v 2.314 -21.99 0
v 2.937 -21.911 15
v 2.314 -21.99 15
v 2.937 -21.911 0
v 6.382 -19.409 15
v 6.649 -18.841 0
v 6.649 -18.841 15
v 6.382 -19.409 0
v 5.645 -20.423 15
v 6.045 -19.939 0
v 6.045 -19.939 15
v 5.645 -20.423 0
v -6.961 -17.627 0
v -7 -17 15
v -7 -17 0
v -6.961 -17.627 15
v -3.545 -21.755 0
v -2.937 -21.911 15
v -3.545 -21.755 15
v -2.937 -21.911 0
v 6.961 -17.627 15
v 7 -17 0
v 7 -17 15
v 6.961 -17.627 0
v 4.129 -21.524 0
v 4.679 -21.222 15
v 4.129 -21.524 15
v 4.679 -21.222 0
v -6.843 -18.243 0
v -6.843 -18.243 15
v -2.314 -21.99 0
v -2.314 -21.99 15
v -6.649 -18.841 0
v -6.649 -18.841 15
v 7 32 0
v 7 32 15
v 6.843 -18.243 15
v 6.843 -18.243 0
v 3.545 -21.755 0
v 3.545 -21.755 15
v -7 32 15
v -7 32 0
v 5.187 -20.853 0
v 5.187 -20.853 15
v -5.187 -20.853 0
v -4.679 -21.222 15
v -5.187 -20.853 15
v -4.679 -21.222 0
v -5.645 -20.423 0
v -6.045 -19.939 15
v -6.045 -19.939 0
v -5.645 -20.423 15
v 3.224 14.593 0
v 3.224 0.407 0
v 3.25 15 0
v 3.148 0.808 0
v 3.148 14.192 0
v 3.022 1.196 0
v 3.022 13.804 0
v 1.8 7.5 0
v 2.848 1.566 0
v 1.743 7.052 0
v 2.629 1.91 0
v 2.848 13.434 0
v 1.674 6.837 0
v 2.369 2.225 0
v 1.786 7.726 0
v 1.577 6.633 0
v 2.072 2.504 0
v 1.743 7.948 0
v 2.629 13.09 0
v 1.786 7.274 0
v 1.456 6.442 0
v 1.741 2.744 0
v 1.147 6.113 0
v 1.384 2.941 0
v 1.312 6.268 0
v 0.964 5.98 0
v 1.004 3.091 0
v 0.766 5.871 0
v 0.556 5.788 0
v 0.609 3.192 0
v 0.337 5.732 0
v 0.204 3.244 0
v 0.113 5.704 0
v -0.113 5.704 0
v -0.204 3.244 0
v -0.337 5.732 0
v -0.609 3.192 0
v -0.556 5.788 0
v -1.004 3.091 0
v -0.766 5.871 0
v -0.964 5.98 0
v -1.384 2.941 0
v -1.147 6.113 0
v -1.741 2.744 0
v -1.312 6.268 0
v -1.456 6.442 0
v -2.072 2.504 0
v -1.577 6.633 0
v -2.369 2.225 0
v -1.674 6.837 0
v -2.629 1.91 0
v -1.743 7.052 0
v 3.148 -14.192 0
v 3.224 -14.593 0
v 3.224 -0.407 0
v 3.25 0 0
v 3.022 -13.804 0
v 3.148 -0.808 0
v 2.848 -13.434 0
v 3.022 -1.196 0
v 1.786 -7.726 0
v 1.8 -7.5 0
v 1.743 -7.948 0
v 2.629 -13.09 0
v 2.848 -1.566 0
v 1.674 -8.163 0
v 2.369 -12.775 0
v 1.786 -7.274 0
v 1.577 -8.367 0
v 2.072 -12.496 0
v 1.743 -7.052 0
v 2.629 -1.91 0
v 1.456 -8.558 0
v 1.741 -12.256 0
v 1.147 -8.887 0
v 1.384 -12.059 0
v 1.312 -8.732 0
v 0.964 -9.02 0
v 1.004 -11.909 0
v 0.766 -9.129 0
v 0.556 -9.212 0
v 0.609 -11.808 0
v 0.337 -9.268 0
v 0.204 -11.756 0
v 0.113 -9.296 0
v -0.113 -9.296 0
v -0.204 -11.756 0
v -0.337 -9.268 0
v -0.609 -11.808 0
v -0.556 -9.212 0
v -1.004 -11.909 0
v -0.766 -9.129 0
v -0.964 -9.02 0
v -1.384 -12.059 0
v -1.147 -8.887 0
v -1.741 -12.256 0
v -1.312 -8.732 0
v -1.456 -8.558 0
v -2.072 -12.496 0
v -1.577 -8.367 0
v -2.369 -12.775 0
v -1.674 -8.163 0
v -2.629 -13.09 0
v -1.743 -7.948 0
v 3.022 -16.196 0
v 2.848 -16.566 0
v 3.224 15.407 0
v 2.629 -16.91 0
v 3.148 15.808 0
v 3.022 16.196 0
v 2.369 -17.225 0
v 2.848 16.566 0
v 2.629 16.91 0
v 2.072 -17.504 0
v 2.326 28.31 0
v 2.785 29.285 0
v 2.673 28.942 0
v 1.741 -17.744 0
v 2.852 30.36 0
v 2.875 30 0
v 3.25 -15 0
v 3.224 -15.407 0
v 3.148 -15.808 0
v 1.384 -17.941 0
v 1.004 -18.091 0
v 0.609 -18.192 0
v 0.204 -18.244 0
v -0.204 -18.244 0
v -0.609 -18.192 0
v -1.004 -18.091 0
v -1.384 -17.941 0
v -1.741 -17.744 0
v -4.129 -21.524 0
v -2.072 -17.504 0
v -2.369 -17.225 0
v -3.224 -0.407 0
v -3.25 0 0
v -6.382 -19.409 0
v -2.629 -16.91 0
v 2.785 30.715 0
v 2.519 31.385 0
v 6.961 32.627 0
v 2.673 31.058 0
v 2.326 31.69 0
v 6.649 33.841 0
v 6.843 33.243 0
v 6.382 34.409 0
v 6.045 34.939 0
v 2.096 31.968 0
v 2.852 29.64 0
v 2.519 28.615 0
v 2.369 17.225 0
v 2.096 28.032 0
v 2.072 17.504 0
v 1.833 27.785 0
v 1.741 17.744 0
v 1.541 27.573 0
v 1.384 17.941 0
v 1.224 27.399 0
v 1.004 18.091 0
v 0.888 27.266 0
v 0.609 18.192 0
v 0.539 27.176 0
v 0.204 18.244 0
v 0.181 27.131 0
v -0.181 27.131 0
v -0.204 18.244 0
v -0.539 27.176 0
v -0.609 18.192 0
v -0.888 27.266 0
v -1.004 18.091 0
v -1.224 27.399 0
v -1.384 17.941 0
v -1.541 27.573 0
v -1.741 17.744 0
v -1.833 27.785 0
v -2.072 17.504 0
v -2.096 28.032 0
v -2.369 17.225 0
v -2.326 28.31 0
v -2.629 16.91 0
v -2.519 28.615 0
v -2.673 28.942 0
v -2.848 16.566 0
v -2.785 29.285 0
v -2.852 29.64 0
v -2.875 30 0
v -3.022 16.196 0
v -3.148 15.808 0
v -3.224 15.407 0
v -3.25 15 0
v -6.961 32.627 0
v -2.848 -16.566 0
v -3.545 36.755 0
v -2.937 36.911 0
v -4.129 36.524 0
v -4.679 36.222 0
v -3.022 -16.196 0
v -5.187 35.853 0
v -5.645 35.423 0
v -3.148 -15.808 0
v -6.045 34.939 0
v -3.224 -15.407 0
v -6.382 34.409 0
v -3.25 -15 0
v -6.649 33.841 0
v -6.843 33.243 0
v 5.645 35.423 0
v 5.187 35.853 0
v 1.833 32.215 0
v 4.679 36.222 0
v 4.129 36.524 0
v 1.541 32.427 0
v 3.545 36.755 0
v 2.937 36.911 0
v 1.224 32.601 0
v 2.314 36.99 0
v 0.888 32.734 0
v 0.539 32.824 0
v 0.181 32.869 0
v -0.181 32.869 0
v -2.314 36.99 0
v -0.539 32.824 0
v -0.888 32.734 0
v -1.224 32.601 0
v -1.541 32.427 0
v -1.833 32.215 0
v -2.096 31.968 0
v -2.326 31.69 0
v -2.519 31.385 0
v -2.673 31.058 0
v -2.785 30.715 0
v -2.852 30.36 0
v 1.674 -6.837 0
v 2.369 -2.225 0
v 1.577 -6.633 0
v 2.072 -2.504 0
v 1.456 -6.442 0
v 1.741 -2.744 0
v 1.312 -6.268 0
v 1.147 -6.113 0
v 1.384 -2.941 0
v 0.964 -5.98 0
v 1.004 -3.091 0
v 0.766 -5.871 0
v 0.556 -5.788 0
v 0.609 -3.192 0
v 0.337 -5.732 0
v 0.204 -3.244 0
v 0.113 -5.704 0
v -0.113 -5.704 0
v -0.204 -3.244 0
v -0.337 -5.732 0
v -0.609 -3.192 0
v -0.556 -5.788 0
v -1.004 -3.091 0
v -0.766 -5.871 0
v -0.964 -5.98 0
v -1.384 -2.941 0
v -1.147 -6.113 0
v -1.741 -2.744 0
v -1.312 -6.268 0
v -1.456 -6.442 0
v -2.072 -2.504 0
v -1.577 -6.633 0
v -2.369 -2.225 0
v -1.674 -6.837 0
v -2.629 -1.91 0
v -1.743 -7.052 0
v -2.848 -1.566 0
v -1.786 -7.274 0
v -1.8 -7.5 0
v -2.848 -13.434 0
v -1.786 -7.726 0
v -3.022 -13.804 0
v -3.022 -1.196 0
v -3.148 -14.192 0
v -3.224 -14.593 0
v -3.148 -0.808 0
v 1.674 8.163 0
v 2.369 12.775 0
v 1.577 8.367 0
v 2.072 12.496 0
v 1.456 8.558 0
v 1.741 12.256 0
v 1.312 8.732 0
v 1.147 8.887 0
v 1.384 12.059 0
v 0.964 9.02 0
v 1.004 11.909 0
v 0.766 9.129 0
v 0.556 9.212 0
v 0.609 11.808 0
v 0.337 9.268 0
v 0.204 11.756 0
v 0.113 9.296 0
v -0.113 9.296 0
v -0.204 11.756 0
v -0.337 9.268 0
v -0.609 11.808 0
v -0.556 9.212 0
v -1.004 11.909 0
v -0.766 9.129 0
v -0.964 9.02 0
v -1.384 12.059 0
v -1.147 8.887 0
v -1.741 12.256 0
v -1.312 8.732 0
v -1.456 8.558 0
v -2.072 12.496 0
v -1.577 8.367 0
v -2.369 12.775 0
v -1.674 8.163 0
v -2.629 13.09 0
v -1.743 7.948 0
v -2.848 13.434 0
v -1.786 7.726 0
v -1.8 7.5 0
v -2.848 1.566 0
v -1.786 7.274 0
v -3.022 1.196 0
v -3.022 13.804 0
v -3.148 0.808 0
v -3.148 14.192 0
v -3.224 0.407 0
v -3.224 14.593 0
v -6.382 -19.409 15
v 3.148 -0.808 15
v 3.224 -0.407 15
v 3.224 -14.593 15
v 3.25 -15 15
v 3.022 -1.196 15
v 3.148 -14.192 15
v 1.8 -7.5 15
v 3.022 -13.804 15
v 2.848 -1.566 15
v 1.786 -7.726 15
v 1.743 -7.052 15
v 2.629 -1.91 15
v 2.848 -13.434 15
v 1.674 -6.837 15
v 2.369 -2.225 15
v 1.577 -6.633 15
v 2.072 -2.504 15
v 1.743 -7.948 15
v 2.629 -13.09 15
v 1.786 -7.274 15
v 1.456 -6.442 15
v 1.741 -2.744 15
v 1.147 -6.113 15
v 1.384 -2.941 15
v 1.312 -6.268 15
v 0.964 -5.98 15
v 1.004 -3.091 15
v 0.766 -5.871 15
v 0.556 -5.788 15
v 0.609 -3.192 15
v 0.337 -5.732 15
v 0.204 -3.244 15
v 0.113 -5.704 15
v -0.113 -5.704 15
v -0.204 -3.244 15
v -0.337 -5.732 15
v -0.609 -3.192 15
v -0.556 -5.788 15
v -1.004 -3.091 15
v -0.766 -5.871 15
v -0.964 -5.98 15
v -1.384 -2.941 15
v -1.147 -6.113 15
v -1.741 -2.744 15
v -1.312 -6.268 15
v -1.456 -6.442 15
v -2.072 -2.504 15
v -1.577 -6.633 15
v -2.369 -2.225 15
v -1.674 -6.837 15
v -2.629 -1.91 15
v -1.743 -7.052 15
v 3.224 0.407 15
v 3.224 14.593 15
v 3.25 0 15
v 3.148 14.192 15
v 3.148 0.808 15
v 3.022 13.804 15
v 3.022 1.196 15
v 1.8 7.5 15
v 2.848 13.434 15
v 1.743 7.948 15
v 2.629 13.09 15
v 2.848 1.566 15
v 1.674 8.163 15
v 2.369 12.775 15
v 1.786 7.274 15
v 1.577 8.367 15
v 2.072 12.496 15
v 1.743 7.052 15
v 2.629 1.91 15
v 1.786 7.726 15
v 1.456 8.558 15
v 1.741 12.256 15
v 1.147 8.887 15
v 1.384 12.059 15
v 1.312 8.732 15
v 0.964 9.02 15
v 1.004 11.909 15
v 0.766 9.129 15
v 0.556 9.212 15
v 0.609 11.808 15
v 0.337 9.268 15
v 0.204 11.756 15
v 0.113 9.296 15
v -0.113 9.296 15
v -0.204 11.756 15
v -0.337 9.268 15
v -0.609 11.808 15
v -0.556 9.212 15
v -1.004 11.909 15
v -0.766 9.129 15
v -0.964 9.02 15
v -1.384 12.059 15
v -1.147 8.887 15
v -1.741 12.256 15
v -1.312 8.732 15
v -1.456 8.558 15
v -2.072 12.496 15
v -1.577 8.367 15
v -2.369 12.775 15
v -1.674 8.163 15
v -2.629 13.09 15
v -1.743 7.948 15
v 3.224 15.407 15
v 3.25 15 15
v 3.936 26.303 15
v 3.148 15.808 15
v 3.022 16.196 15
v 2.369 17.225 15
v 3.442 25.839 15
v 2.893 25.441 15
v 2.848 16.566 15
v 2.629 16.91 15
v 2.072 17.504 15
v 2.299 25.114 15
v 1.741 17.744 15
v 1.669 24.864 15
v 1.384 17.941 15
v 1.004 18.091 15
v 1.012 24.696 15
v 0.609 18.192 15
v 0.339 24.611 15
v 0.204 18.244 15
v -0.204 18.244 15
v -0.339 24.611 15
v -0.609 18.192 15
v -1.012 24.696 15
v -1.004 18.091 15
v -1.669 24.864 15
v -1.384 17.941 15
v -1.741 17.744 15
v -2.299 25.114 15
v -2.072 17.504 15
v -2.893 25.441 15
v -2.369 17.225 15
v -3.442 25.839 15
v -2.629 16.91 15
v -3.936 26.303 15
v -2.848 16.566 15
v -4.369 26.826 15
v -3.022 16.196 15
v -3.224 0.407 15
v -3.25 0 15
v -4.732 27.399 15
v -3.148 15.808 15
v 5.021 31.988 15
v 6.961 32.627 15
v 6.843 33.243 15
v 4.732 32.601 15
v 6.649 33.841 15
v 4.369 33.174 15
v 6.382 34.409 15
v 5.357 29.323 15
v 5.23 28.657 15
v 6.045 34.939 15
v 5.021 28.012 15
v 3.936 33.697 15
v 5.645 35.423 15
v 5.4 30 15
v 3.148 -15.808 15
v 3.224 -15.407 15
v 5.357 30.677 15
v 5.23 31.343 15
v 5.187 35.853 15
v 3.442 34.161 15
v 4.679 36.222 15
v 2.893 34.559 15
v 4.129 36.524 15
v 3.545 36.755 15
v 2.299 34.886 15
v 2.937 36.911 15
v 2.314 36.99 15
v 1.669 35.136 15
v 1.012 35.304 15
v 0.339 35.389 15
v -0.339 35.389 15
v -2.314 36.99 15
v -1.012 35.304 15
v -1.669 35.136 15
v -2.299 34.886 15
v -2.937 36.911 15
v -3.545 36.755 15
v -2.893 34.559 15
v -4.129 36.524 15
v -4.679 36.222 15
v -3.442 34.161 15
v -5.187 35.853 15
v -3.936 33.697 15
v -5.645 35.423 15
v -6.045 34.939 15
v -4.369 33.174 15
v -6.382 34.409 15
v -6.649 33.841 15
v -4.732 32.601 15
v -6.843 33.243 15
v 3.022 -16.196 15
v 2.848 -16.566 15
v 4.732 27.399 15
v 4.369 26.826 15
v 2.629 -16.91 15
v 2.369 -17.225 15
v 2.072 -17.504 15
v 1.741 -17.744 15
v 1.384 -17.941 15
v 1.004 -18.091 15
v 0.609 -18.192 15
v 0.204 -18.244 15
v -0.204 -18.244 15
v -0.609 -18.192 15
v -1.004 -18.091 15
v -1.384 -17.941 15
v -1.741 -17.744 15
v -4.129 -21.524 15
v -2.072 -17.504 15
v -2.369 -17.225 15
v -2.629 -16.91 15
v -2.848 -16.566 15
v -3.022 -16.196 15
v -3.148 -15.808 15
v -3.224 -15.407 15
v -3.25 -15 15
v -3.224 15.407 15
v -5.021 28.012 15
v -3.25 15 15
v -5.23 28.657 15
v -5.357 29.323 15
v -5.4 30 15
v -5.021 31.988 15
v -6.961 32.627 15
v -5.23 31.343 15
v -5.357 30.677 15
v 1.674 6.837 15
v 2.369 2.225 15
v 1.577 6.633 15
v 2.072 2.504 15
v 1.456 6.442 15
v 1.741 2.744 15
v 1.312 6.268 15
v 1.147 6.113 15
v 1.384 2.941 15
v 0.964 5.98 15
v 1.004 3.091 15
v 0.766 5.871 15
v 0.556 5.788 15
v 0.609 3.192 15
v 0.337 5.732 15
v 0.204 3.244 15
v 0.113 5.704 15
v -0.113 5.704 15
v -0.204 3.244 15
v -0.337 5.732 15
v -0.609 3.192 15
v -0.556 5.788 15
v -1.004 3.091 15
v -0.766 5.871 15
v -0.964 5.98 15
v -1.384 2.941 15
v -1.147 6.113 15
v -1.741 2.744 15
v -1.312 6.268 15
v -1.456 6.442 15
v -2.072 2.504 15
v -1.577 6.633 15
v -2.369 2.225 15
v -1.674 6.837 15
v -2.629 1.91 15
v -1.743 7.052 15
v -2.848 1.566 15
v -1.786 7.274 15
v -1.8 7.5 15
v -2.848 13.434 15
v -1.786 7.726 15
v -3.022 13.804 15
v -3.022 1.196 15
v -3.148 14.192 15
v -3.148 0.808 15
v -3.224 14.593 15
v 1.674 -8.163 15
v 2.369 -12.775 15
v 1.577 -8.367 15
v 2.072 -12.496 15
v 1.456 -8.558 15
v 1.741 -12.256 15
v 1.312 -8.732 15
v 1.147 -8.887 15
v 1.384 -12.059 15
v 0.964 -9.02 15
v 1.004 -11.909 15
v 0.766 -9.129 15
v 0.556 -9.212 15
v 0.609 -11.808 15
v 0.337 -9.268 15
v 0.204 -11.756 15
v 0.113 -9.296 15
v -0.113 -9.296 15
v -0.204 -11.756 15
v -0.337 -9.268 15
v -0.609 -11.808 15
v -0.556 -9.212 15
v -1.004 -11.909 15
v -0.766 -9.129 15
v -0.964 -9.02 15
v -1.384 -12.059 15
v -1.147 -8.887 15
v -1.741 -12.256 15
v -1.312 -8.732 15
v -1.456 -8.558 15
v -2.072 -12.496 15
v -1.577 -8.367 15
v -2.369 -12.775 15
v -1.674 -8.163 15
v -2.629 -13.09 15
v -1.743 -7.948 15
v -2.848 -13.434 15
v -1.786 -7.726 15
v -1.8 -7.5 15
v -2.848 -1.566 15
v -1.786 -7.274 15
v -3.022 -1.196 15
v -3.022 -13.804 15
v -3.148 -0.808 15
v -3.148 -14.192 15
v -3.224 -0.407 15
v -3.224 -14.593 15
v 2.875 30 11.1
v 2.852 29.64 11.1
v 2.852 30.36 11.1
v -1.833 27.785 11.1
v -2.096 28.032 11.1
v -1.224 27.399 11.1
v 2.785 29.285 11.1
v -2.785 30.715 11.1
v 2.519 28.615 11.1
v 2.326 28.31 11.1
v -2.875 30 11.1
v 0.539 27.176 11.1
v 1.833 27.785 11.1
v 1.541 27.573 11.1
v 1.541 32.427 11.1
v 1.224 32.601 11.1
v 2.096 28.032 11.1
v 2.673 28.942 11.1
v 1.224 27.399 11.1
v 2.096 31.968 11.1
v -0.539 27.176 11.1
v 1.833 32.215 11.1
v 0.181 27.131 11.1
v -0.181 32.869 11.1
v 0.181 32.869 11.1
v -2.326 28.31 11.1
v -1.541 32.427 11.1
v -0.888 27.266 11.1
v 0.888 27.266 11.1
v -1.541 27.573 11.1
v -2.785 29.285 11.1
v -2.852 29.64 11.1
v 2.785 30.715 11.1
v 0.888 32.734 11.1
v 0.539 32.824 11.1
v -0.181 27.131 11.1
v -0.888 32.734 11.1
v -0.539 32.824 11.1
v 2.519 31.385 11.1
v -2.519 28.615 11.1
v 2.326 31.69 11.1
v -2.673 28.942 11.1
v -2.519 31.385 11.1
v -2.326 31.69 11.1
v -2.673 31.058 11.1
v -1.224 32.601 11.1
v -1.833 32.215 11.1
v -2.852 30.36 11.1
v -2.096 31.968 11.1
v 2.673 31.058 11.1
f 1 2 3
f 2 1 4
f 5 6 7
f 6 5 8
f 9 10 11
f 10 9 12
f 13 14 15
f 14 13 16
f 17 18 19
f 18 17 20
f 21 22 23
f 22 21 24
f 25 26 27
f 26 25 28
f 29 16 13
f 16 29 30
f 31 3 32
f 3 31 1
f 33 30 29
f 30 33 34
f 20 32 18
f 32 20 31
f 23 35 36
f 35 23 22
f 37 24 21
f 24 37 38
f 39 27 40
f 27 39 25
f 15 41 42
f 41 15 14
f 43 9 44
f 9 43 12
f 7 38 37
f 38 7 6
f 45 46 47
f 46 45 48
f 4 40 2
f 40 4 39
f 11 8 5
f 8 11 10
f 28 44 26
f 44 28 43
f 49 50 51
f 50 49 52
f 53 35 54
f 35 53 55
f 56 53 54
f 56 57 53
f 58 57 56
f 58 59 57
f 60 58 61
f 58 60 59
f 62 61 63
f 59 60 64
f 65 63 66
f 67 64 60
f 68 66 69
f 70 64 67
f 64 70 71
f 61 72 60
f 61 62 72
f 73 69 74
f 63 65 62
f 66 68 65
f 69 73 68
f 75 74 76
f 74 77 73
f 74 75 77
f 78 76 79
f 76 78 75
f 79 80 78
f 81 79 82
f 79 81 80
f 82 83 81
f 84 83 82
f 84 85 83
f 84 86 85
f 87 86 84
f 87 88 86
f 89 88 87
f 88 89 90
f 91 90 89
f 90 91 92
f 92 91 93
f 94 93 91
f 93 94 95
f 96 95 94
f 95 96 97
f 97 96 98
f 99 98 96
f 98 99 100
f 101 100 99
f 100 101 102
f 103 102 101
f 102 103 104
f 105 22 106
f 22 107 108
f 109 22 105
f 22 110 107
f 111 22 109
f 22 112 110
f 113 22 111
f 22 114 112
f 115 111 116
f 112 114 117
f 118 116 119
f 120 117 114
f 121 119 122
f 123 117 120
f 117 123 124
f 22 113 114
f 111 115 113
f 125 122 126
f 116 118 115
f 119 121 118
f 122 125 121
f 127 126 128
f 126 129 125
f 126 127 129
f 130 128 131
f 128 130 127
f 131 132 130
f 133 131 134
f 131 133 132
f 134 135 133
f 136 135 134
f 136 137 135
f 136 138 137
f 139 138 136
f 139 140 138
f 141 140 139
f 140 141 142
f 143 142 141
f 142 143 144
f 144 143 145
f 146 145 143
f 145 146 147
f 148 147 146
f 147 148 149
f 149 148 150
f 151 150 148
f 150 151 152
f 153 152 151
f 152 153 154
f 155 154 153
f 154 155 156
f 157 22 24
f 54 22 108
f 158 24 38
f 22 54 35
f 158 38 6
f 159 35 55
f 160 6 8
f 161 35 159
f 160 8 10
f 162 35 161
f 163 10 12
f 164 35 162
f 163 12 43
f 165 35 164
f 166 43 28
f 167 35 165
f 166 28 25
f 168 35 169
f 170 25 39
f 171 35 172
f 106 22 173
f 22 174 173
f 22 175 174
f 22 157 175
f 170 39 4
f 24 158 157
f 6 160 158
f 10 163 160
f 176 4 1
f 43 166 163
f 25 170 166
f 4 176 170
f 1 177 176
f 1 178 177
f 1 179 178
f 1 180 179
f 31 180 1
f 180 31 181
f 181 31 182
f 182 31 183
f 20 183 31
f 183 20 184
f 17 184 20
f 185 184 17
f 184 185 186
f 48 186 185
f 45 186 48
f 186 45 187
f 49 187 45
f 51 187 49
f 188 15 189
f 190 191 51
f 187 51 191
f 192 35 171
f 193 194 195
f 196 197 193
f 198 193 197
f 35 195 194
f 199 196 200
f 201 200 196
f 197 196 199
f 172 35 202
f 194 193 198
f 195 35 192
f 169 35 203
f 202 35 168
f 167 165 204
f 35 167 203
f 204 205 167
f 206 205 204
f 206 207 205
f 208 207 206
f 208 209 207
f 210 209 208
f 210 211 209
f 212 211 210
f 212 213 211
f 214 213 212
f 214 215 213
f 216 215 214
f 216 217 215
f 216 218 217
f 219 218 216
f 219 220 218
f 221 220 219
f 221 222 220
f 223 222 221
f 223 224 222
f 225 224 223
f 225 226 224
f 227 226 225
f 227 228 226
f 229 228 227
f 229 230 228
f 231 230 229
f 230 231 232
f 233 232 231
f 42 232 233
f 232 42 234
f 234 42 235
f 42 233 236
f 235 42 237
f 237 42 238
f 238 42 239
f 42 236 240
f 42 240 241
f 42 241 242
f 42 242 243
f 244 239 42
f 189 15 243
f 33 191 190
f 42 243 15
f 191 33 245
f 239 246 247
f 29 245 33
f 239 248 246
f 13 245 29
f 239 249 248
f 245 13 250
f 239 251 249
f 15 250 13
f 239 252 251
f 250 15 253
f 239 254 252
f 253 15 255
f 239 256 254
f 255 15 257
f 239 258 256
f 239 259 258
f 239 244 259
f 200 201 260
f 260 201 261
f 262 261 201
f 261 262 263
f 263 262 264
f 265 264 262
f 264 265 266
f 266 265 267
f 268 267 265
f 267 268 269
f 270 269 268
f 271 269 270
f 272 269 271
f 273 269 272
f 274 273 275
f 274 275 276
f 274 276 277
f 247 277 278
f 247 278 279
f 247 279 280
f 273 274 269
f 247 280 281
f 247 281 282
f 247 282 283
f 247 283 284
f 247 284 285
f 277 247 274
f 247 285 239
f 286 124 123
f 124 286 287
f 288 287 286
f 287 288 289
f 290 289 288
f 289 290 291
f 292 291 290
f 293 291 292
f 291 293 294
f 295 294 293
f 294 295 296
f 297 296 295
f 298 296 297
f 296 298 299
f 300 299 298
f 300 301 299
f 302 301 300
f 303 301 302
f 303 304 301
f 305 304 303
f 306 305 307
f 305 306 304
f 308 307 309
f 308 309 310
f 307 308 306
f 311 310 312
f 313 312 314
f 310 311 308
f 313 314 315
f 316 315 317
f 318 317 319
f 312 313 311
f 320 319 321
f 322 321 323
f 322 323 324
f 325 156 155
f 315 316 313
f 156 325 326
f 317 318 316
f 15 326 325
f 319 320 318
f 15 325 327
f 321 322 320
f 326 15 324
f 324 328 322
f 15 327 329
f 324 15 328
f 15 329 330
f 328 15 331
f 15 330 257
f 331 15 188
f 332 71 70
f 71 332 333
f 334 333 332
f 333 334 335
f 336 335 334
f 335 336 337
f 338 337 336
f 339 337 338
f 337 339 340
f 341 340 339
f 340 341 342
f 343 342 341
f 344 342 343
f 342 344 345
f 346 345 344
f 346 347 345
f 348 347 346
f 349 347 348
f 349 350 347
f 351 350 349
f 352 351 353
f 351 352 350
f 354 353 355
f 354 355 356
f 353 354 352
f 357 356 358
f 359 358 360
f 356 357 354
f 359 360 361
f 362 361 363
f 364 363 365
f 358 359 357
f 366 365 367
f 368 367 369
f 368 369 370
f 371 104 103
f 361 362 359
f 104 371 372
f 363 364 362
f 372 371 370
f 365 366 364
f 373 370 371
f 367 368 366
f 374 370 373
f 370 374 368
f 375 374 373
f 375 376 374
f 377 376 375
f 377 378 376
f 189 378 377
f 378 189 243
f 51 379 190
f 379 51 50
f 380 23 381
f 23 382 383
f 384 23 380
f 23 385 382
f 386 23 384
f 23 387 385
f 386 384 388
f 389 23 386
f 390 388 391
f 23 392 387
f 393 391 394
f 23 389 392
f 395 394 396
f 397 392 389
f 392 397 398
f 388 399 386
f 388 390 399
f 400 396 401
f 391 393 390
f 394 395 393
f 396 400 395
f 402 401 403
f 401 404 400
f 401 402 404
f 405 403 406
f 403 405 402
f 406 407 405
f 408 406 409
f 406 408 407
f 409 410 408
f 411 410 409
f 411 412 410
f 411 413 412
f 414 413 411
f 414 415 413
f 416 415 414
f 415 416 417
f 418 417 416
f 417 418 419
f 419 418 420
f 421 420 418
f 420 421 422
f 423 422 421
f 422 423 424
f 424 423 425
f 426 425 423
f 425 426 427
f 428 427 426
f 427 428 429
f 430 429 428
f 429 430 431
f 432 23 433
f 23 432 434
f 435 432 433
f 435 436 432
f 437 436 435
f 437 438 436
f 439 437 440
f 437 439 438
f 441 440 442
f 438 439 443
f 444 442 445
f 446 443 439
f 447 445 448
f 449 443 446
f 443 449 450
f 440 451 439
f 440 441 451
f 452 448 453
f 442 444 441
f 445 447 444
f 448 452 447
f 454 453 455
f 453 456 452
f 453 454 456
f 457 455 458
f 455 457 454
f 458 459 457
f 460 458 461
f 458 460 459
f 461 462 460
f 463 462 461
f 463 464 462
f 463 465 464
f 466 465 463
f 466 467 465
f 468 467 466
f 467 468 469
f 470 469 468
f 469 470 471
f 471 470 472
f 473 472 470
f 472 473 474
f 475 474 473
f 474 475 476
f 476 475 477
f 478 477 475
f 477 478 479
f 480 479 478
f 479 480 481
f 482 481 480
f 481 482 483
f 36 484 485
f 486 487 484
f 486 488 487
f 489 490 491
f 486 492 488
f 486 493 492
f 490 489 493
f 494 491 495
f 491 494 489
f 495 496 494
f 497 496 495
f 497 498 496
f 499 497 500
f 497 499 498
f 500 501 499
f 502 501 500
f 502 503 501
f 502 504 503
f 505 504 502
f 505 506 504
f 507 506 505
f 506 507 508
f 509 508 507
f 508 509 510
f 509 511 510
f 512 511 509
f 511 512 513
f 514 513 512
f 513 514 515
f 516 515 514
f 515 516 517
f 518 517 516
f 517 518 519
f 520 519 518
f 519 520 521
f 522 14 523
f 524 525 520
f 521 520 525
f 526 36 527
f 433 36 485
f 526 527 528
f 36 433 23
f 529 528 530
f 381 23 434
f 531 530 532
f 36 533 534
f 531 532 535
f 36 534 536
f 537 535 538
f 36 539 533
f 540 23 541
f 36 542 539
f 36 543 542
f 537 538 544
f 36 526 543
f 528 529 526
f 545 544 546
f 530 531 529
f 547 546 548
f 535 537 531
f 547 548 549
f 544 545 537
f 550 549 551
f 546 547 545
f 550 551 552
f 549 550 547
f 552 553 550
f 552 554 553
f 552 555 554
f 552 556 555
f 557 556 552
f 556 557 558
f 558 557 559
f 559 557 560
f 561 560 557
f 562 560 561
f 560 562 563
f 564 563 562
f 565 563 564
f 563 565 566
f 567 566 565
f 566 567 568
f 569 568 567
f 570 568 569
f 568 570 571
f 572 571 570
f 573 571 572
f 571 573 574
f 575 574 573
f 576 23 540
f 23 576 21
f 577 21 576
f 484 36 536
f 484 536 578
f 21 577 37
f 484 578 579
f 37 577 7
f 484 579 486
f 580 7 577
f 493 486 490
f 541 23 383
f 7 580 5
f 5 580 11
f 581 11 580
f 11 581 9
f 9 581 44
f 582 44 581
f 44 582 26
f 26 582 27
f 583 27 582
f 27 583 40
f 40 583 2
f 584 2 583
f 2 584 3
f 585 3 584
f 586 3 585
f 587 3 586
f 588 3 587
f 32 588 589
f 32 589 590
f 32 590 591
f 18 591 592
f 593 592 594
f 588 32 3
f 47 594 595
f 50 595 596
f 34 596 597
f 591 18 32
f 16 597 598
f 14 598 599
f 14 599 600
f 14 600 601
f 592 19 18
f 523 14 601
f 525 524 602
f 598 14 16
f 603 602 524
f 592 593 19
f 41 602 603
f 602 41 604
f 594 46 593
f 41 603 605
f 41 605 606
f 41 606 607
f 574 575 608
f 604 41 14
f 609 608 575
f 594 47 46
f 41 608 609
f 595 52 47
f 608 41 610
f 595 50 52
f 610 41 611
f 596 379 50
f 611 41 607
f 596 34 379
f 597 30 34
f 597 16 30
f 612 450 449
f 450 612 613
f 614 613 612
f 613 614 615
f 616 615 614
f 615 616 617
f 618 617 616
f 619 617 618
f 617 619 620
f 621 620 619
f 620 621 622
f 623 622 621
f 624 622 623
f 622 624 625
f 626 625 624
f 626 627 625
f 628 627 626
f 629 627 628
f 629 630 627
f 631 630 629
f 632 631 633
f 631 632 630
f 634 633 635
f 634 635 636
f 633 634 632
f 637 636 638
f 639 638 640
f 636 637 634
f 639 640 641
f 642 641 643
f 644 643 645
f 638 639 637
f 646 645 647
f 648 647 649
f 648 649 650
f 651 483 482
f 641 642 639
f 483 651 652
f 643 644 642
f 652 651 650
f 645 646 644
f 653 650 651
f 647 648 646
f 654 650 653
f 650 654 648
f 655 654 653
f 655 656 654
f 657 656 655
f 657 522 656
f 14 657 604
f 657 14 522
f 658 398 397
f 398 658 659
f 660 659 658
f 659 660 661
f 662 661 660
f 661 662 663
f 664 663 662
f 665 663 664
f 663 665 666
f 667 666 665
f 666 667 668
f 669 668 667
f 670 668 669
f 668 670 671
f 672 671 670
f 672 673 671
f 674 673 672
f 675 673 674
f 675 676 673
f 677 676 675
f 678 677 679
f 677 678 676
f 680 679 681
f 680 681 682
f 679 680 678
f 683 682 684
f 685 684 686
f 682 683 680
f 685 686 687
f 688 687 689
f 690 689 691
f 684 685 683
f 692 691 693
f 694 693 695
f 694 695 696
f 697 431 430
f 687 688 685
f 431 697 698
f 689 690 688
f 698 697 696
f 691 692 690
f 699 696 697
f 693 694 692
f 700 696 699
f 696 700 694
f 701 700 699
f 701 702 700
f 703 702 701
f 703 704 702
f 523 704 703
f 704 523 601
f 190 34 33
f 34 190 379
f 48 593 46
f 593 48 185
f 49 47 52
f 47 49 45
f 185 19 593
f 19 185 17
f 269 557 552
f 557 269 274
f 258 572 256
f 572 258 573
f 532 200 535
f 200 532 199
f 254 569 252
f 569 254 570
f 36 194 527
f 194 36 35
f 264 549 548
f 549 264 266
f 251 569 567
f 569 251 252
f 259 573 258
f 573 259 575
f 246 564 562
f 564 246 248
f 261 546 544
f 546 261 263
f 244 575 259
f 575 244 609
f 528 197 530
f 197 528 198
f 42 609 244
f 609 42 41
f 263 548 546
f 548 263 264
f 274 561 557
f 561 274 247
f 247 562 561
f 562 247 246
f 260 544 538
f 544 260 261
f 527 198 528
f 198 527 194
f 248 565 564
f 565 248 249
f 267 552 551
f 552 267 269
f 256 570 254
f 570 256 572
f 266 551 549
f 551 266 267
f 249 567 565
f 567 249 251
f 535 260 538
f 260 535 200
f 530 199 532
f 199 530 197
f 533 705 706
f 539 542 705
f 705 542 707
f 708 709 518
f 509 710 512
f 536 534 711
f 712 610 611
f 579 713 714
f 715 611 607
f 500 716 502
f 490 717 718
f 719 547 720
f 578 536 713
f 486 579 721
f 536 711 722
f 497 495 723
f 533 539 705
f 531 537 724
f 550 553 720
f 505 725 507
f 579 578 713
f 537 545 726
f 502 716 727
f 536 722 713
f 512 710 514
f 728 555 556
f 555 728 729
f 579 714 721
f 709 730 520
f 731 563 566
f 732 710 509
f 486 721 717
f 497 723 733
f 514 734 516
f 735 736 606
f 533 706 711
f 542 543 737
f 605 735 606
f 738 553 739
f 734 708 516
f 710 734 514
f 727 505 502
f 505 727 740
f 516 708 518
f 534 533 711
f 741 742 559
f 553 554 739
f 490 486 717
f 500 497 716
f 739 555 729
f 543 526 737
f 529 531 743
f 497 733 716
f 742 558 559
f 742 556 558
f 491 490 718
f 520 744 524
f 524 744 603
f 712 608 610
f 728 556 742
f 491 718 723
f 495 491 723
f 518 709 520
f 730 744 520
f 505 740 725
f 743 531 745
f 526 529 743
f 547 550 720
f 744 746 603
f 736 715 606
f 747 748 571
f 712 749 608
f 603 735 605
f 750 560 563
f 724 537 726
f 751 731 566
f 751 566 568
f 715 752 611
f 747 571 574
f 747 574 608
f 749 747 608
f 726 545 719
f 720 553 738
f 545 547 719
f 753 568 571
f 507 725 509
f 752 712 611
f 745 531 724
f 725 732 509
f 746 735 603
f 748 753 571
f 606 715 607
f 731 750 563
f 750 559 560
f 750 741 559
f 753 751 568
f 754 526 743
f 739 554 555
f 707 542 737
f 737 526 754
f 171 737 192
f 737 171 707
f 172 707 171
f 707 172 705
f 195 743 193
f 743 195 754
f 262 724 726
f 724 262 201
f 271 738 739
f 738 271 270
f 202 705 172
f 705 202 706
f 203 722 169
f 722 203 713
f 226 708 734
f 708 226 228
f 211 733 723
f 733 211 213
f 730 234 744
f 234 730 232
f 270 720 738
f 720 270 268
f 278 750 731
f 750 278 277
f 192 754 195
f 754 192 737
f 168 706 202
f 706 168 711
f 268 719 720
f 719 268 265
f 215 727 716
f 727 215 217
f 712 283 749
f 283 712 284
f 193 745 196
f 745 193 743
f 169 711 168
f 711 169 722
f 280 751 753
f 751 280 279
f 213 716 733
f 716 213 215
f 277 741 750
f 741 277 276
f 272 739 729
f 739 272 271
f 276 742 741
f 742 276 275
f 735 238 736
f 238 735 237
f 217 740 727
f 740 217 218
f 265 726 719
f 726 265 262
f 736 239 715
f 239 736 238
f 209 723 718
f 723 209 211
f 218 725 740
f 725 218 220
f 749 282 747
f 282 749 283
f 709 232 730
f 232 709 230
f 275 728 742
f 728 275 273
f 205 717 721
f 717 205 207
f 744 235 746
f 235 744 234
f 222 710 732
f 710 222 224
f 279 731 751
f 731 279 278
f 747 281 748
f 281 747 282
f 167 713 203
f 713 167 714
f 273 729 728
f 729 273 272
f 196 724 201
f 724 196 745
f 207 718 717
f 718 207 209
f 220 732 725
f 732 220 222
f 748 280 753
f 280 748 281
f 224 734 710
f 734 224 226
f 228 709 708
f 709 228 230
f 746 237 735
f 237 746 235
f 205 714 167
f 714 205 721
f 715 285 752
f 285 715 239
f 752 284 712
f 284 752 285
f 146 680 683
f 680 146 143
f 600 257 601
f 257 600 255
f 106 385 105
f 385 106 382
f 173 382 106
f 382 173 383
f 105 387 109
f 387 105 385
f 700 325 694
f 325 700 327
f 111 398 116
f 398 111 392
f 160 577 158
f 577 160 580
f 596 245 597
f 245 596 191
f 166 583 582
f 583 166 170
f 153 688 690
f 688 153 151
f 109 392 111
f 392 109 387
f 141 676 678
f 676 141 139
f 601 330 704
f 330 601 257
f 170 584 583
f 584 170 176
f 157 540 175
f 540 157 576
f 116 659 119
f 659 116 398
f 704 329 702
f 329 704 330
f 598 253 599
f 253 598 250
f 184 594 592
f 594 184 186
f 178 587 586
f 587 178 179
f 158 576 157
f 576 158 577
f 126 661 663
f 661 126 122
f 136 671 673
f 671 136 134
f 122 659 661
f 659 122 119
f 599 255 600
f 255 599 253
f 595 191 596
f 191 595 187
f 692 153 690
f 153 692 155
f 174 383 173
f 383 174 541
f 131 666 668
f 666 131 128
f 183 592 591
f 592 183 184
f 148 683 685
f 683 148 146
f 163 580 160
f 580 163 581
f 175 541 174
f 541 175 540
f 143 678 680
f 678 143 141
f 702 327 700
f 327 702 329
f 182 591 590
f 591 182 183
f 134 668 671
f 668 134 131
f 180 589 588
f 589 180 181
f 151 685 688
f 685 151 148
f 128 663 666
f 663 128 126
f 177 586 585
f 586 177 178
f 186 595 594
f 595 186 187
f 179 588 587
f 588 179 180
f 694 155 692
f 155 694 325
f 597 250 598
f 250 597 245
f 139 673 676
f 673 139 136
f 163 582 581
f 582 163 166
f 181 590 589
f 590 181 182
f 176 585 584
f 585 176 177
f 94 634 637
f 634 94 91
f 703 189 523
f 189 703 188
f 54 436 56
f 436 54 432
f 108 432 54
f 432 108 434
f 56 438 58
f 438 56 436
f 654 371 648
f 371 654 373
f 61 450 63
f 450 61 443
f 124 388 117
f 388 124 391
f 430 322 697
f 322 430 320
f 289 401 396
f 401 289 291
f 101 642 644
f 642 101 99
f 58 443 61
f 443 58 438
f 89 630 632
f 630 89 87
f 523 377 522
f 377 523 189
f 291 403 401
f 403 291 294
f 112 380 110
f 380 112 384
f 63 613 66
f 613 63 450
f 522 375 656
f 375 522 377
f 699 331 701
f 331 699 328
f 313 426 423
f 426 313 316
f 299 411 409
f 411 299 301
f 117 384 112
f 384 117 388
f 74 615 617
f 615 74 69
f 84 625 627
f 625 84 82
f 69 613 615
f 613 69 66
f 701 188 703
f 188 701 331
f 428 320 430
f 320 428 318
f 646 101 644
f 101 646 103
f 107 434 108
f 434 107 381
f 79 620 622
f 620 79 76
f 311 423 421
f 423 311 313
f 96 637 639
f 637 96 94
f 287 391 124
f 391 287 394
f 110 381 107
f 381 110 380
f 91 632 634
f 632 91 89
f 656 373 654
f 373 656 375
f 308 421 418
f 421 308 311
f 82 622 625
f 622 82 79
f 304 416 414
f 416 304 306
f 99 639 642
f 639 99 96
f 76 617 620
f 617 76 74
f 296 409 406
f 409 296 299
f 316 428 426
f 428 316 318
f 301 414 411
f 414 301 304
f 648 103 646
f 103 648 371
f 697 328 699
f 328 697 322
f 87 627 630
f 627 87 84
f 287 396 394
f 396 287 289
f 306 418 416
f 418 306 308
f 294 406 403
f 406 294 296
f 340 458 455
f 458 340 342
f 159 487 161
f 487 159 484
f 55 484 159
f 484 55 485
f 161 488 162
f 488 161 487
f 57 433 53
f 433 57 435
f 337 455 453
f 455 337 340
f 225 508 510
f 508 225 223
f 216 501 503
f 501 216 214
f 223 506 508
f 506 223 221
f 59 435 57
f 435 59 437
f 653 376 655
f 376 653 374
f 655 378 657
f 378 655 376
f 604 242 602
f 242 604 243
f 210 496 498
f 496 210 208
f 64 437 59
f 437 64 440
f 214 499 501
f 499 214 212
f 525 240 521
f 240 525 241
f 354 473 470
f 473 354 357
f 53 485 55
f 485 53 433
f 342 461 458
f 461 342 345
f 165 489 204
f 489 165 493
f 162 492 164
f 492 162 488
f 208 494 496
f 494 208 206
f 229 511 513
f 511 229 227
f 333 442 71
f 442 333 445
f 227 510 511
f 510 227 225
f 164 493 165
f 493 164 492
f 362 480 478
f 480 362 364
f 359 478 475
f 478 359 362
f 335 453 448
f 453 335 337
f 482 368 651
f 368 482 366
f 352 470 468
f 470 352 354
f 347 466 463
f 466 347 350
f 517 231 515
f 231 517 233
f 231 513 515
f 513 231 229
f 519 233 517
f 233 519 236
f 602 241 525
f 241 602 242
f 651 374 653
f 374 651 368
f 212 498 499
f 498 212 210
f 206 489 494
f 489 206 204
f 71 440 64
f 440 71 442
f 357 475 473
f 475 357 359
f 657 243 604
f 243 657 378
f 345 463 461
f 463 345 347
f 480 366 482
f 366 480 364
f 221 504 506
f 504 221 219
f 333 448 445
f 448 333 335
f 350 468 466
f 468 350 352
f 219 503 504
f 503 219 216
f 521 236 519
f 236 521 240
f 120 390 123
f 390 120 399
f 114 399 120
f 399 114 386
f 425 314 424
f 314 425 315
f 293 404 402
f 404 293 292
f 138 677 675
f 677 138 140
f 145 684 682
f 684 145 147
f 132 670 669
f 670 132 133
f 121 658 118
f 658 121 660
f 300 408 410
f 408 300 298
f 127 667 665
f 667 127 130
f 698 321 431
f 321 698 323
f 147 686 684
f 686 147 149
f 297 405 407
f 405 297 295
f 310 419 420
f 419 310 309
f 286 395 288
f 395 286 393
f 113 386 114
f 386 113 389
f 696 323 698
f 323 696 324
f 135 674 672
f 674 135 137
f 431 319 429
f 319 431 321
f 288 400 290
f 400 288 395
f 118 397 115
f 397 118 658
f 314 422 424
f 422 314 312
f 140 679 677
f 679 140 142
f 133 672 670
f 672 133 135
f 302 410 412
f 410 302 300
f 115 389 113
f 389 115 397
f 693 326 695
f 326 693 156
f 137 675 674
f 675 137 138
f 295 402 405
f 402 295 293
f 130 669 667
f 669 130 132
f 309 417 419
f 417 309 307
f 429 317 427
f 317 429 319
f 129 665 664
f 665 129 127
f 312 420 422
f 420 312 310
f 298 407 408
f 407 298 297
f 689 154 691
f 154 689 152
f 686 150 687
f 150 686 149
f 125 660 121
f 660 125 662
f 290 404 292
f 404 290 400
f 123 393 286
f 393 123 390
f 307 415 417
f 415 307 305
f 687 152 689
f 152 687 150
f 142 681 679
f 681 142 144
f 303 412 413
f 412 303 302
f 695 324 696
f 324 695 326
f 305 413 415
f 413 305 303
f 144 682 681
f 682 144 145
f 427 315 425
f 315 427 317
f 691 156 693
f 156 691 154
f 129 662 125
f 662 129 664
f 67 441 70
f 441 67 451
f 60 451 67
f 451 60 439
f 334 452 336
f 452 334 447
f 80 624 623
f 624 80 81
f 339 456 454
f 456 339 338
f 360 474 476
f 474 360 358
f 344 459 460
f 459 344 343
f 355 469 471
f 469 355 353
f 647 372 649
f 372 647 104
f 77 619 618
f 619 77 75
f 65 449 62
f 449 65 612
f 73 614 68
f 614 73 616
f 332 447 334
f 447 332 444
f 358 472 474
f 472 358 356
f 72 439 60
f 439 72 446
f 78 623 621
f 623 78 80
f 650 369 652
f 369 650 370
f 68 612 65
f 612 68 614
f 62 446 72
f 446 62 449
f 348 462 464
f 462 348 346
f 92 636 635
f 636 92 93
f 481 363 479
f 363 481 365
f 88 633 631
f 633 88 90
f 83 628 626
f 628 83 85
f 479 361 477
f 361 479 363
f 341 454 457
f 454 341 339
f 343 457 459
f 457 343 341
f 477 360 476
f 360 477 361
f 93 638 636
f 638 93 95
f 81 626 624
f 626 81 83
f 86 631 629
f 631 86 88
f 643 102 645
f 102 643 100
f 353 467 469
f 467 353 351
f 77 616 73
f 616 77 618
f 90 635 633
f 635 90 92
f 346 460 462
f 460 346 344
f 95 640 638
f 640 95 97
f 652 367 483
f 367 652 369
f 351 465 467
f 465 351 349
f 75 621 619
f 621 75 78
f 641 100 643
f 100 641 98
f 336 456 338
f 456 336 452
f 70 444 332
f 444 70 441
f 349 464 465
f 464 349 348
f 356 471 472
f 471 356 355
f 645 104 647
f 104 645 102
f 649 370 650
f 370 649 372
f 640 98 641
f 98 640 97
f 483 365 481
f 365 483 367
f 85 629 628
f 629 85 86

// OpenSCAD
$fn = 50;


difference() {
	union() {
		hull() {
			translate(v = [-2.0000000000, 17.0000000000, 0]) {
				cylinder(h = 15, r = 5);
			}
			translate(v = [2.0000000000, 17.0000000000, 0]) {
				cylinder(h = 15, r = 5);
			}
			translate(v = [-2.0000000000, -17.0000000000, 0]) {
				cylinder(h = 15, r = 5);
			}
			translate(v = [2.0000000000, -17.0000000000, 0]) {
				cylinder(h = 15, r = 5);
			}
		}
		translate(v = [0.0000000000, 22.5000000000, 0]) {
			hull() {
				translate(v = [-2.0000000000, 9.5000000000, 0]) {
					cylinder(h = 15, r = 5);
				}
				translate(v = [2.0000000000, 9.5000000000, 0]) {
					cylinder(h = 15, r = 5);
				}
				translate(v = [-2.0000000000, -9.5000000000, 0]) {
					cylinder(h = 15, r = 5);
				}
				translate(v = [2.0000000000, -9.5000000000, 0]) {
					cylinder(h = 15, r = 5);
				}
			}
		}
		translate(v = [0.0000000000, 22.5000000000, 0]) {
			hull() {
				translate(v = [-2.0000000000, 9.5000000000, 0]) {
					cylinder(h = 15, r = 5);
				}
				translate(v = [2.0000000000, 9.5000000000, 0]) {
					cylinder(h = 15, r = 5);
				}
				translate(v = [-2.0000000000, -9.5000000000, 0]) {
					cylinder(h = 15, r = 5);
				}
				translate(v = [2.0000000000, -9.5000000000, 0]) {
					cylinder(h = 15, r = 5);
				}
			}
		}
	}
	union() {
		translate(v = [0.0000000000, 30.0000000000, 15]) {
			rotate(a = [0, 0, 0]) {
				difference() {
					union() {
						#translate(v = [0, 0, -15.0000000000]) {
							cylinder(h = 15, r = 2.6000000000);
						}
						#translate(v = [0, 0, -3.9000000000]) {
							cylinder(h = 3.9000000000, r1 = 2.8750000000, r2 = 5.4000000000);
						}
						#translate(v = [0, 0, -15.0000000000]) {
							cylinder(h = 15, r = 2.8750000000);
						}
						#translate(v = [0, 0, -15.0000000000]) {
							cylinder(h = 15, r = 2.6000000000);
						}
					}
					union();
				}
			}
		}
		translate(v = [0.0000000000, 30.0000000000, 15]) {
			rotate(a = [0, 0, 0]) {
				difference() {
					union() {
						#translate(v = [0, 0, -15.0000000000]) {
							cylinder(h = 15, r = 2.6000000000);
						}
						#translate(v = [0, 0, -3.9000000000]) {
							cylinder(h = 3.9000000000, r1 = 2.8750000000, r2 = 5.4000000000);
						}
						#translate(v = [0, 0, -15.0000000000]) {
							cylinder(h = 15, r = 2.8750000000);
						}
						#translate(v = [0, 0, -15.0000000000]) {
							cylinder(h = 15, r = 2.6000000000);
						}
					}
					union();
				}
			}
		}
		translate(v = [0.0000000000, -15.0000000000, 0]) {
			translate(v = [0, 0, -100]) {
				cylinder(h = 200, r = 3.2500000000);
			}
		}
		translate(v = [0, 0, -100]) {
			cylinder(h = 200, r = 3.2500000000);
		}
		translate(v = [0.0000000000, 15.0000000000, 0]) {
			translate(v = [0, 0, -100]) {
				cylinder(h = 200, r = 3.2500000000);
			}
		}
		translate(v = [0.0000000000, -15.0000000000, 0]) {
			translate(v = [0, 0, -100]) {
				cylinder(h = 200, r = 1.8000000000);
			}
		}
		translate(v = [0.0000000000, -7.5000000000, 0]) {
			translate(v = [0, 0, -100]) {
				cylinder(h = 200, r = 1.8000000000);
			}
		}
		translate(v = [0, 0, -100]) {
			cylinder(h = 200, r = 1.8000000000);
		}
		translate(v = [0.0000000000, 7.5000000000, 0]) {
			translate(v = [0, 0, -100]) {
				cylinder(h = 200, r = 1.8000000000);
			}
		}
		translate(v = [0.0000000000, 15.0000000000, 0]) {
			translate(v = [0, 0, -100]) {
				cylinder(h = 200, r = 1.8000000000);
			}
		}
	}
}
